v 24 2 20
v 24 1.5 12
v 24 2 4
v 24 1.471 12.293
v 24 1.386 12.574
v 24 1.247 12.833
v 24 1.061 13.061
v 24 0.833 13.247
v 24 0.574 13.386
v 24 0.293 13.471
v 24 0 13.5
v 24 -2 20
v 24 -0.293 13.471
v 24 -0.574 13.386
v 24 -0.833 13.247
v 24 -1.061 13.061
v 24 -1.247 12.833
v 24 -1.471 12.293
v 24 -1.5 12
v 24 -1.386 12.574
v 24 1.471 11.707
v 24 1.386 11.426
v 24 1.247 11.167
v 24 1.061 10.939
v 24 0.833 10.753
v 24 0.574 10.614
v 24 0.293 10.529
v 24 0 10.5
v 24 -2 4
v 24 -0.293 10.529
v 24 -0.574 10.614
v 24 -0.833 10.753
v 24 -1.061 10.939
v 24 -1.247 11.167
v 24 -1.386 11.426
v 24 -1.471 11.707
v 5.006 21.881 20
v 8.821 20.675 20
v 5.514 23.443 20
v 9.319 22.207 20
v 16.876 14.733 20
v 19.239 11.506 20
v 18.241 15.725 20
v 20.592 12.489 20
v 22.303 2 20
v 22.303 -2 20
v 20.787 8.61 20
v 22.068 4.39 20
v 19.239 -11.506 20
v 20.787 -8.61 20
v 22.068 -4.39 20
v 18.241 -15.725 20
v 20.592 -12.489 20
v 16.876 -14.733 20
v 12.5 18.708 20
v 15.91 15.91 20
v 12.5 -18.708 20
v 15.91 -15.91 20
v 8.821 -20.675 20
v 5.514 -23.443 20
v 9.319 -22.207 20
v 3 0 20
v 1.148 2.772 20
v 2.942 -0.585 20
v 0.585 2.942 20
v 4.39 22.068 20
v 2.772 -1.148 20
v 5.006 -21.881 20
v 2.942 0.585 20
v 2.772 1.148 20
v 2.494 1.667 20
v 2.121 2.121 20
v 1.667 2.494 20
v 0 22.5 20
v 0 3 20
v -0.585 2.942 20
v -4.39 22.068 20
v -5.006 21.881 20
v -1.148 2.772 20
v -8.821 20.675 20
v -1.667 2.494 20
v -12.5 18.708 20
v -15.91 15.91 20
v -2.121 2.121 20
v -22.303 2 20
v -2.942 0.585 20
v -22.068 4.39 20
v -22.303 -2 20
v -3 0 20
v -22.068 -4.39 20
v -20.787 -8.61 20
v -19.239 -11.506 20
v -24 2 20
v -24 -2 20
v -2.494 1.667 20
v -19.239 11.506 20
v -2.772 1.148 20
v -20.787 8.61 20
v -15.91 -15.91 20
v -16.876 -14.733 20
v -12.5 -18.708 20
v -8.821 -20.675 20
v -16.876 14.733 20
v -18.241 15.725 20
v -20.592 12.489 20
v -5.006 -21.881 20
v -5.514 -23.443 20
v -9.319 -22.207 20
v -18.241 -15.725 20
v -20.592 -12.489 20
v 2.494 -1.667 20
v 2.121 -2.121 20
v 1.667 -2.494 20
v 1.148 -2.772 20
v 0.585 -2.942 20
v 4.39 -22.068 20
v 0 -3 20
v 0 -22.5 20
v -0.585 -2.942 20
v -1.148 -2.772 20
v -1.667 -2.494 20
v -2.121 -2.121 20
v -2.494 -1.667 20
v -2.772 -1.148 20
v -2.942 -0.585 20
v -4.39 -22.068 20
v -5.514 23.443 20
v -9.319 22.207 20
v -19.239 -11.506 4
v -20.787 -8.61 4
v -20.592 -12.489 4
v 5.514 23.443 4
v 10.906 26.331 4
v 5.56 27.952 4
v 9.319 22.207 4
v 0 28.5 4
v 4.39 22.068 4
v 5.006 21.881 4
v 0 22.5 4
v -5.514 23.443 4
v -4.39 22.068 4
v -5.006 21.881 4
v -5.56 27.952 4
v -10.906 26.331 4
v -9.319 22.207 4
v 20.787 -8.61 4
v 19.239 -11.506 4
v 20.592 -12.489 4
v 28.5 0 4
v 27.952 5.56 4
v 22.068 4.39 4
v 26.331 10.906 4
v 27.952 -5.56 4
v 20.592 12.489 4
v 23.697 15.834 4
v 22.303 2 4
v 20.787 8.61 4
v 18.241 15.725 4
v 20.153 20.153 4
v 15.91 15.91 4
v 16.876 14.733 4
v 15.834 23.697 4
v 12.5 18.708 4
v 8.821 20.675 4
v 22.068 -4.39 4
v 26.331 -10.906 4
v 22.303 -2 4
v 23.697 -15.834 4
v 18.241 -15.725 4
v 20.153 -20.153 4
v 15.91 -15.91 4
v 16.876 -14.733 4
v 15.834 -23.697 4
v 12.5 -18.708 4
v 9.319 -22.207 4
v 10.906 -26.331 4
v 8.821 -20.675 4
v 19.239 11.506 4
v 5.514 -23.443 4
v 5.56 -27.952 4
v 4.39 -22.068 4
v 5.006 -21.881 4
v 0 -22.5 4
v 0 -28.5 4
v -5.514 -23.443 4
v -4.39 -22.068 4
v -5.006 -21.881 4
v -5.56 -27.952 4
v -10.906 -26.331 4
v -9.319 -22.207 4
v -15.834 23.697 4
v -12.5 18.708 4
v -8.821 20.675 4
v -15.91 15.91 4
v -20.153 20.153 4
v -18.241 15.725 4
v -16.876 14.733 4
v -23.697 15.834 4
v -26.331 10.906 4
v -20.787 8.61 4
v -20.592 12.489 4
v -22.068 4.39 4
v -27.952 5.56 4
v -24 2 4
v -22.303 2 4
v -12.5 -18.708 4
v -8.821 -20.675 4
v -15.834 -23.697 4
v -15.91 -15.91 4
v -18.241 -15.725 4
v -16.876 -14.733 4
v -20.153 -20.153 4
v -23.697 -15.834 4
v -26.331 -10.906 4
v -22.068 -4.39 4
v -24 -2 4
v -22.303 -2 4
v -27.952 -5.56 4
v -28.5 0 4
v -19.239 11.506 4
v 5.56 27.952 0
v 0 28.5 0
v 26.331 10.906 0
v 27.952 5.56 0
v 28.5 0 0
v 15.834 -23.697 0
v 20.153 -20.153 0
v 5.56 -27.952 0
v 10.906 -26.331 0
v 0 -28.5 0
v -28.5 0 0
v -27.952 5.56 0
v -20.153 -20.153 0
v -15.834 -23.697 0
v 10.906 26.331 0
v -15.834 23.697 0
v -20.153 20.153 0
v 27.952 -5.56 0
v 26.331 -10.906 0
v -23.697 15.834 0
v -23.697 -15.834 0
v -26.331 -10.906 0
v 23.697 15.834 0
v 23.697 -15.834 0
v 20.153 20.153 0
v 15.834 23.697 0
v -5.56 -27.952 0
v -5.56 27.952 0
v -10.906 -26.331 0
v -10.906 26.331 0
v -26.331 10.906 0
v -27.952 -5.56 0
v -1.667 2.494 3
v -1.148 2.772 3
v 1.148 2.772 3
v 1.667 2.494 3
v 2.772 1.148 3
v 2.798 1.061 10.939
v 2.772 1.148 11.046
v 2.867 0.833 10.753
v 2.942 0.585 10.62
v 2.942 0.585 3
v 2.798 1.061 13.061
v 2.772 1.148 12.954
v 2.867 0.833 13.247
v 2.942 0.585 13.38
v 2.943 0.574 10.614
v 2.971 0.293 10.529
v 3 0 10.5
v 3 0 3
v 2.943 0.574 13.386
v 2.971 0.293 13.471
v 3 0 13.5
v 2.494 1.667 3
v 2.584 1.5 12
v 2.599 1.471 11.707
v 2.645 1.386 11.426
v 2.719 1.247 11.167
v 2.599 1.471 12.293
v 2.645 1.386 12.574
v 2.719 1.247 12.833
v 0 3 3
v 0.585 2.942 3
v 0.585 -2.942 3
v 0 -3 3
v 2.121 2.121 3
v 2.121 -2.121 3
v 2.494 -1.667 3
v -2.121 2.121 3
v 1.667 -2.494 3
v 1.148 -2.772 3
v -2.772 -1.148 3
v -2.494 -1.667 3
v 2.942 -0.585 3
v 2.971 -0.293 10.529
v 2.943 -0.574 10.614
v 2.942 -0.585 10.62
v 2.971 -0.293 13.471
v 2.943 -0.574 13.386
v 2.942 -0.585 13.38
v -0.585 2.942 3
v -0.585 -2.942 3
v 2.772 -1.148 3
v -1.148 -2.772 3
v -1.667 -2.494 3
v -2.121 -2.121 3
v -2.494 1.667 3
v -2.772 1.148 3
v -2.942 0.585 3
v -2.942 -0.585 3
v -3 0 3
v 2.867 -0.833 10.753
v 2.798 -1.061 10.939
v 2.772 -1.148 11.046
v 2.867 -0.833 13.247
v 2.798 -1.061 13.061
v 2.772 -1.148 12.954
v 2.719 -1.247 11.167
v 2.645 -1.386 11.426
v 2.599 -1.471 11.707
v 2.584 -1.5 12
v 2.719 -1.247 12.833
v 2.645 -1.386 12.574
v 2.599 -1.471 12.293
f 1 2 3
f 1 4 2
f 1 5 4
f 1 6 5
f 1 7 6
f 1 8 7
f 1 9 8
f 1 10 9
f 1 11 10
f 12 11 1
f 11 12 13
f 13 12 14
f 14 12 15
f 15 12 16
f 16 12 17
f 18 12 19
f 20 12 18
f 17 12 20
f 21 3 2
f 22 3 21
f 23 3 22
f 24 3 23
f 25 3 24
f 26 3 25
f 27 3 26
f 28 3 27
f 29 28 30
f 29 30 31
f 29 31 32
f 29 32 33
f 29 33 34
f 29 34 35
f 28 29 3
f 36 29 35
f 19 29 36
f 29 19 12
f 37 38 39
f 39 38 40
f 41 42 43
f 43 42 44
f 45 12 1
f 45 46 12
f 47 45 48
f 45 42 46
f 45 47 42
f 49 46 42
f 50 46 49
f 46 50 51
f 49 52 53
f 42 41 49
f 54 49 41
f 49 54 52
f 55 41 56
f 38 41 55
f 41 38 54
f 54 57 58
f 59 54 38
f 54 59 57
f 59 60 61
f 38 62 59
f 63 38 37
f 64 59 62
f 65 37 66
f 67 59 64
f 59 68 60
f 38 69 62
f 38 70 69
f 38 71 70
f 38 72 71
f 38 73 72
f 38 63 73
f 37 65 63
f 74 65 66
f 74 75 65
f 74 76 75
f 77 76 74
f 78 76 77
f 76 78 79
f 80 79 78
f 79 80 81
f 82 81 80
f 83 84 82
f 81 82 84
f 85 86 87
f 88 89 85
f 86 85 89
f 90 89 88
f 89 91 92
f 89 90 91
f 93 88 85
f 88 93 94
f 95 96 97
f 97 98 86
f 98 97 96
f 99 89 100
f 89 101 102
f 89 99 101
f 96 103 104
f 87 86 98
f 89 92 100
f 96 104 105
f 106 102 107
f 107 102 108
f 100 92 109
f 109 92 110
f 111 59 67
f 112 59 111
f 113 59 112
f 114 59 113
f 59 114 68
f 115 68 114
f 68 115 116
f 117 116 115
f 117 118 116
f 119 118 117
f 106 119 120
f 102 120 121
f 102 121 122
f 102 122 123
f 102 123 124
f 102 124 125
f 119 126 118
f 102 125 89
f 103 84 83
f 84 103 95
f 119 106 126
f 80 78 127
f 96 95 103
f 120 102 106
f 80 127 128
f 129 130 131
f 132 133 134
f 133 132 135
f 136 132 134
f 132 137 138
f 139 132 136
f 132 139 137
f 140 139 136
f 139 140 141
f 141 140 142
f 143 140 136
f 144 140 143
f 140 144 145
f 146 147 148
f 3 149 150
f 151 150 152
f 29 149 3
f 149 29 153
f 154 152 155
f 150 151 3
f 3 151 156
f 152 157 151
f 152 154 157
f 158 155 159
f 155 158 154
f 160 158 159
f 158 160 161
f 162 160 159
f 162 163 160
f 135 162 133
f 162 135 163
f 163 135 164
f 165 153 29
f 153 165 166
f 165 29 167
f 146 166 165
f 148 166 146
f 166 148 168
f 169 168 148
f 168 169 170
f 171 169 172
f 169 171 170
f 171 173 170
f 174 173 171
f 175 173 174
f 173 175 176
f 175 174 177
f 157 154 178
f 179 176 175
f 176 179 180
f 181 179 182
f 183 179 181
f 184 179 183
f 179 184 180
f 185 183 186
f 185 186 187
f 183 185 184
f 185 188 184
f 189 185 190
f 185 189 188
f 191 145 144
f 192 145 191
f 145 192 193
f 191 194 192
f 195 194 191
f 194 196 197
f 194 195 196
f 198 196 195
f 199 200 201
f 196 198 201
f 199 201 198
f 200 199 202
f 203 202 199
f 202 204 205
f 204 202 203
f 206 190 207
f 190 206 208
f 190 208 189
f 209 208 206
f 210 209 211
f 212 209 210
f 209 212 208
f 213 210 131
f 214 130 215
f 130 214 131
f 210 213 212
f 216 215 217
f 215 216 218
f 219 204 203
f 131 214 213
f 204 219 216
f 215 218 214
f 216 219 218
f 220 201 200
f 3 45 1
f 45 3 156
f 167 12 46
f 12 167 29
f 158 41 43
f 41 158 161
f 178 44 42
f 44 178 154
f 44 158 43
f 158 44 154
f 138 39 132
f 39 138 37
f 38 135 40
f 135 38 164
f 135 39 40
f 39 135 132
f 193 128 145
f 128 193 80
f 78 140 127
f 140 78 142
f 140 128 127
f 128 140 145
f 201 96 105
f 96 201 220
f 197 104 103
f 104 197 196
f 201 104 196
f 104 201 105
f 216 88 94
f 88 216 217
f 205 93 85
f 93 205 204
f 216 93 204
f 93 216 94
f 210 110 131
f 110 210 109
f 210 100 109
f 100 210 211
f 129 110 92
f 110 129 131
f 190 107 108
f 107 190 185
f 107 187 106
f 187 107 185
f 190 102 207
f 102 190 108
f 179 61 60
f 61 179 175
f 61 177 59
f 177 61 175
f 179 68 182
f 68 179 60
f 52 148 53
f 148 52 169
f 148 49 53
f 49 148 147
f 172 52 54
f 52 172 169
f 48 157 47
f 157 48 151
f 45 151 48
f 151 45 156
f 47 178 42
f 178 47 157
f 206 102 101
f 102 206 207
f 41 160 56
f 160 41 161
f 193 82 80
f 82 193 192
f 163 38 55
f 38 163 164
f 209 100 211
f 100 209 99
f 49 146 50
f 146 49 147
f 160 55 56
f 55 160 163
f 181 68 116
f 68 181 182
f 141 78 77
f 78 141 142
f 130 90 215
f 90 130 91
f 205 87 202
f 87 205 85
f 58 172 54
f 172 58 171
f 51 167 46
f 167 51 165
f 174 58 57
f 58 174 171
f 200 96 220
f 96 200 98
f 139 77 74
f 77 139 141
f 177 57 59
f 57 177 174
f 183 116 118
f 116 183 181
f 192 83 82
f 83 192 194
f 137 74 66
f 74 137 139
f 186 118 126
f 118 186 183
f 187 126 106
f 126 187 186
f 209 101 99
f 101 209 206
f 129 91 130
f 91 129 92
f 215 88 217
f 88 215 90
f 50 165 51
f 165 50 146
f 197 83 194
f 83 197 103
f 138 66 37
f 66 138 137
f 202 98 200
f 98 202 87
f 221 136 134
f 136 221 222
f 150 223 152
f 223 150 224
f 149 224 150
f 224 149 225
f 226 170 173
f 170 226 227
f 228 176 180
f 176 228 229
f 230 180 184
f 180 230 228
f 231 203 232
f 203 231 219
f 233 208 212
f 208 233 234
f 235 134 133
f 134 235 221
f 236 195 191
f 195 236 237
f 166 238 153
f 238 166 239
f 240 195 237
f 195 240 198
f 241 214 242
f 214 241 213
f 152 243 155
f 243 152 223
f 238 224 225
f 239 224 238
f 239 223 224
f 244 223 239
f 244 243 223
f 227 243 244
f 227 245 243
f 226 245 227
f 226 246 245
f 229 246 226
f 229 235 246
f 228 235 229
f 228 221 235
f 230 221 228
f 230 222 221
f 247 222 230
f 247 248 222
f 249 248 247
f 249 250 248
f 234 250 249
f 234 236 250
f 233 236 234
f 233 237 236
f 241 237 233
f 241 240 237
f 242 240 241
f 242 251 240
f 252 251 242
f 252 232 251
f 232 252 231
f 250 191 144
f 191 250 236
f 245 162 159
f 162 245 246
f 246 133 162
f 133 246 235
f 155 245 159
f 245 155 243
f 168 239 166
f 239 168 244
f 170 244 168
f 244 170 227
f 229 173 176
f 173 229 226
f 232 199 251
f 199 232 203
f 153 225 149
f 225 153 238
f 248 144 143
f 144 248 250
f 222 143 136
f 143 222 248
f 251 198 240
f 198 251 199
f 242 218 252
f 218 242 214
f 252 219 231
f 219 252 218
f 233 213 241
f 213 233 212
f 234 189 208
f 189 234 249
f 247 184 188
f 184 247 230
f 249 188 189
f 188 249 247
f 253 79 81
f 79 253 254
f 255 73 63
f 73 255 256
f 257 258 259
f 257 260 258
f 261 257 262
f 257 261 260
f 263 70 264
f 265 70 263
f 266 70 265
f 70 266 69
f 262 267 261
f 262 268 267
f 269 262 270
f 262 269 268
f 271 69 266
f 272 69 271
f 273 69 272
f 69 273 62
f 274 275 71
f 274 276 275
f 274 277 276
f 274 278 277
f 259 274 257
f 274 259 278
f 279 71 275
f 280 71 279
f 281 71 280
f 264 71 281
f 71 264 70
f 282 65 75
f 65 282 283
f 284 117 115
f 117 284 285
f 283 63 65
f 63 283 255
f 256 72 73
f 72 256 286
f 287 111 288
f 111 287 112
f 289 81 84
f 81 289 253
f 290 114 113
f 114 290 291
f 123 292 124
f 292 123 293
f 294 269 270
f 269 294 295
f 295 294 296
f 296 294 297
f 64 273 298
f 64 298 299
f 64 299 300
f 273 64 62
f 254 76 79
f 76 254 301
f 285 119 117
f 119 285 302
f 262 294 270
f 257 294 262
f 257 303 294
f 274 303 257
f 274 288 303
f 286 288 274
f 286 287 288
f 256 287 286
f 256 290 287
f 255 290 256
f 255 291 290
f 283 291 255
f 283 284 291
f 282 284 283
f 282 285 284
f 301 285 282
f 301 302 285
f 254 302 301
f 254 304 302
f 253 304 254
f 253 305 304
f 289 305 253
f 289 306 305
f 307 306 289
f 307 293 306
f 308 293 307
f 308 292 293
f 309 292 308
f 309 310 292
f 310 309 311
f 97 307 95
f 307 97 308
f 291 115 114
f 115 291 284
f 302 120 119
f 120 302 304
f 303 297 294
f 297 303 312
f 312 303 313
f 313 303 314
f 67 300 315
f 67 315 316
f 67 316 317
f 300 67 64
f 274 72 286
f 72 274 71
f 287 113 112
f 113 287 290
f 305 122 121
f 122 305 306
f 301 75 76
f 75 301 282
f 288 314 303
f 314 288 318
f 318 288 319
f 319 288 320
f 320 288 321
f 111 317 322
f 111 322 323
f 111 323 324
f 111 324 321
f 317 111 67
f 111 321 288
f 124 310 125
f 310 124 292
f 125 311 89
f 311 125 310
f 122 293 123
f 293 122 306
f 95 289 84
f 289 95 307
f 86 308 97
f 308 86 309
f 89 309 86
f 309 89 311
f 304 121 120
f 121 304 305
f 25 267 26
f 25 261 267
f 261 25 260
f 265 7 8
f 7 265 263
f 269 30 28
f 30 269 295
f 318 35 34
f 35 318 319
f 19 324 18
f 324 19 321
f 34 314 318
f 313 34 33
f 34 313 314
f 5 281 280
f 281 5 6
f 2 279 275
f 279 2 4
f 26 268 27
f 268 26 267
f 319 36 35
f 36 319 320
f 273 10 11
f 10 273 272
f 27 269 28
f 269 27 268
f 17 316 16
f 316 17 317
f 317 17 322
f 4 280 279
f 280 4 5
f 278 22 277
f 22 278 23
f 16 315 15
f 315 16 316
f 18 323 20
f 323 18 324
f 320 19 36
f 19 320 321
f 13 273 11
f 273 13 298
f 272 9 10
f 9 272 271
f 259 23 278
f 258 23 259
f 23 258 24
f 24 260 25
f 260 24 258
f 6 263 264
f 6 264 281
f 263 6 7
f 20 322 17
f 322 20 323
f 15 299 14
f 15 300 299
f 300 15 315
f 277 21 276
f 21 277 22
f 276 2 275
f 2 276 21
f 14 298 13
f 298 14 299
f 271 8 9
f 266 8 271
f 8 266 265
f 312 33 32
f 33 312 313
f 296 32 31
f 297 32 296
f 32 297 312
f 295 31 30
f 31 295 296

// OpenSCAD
$fn = 32;

// ----------------------------------------------------------------------
// Control knob: skirt knob with grip ribs
// ----------------------------------------------------------------------

// --- parameters (mm) ---
skirt_d = 57;             // skirt diameter
skirt_t = 4;              // skirt thickness
rib_w = 4;                // grip rib width
rib_out = 2.5;            // grip rib radial protrusion
n_ribs = 10;              // number of grip ribs
knob_d = 45;              // knob body diameter
knob_h = 16;              // knob body height
bore_d = 6;               // shaft bore diameter
set_d = 3;                // set screw bore diameter

rib_step = 360 / n_ribs;  // rib angular step
total_h = skirt_t + knob_h;  // overall height

difference() {
  union() {
    translate([0, 0, skirt_t]) cylinder(h = knob_h, d = knob_d);
    cylinder(h = skirt_t, d = skirt_d);
    for (i = [0 : n_ribs - 1])
      rotate([0, 0, i * rib_step])
        translate([knob_d / 2 - 1, -rib_w / 2, skirt_t])
          cube([rib_out, rib_w, knob_h]);
  }
  translate([0, 0, skirt_t - 1]) cylinder(h = knob_h + 2, d = bore_d);
  translate([-1, 0, skirt_t + knob_h / 2]) rotate([0, 90, 0])
    cylinder(h = knob_d / 2 + bore_d / 2 + 2, d = set_d);
}
